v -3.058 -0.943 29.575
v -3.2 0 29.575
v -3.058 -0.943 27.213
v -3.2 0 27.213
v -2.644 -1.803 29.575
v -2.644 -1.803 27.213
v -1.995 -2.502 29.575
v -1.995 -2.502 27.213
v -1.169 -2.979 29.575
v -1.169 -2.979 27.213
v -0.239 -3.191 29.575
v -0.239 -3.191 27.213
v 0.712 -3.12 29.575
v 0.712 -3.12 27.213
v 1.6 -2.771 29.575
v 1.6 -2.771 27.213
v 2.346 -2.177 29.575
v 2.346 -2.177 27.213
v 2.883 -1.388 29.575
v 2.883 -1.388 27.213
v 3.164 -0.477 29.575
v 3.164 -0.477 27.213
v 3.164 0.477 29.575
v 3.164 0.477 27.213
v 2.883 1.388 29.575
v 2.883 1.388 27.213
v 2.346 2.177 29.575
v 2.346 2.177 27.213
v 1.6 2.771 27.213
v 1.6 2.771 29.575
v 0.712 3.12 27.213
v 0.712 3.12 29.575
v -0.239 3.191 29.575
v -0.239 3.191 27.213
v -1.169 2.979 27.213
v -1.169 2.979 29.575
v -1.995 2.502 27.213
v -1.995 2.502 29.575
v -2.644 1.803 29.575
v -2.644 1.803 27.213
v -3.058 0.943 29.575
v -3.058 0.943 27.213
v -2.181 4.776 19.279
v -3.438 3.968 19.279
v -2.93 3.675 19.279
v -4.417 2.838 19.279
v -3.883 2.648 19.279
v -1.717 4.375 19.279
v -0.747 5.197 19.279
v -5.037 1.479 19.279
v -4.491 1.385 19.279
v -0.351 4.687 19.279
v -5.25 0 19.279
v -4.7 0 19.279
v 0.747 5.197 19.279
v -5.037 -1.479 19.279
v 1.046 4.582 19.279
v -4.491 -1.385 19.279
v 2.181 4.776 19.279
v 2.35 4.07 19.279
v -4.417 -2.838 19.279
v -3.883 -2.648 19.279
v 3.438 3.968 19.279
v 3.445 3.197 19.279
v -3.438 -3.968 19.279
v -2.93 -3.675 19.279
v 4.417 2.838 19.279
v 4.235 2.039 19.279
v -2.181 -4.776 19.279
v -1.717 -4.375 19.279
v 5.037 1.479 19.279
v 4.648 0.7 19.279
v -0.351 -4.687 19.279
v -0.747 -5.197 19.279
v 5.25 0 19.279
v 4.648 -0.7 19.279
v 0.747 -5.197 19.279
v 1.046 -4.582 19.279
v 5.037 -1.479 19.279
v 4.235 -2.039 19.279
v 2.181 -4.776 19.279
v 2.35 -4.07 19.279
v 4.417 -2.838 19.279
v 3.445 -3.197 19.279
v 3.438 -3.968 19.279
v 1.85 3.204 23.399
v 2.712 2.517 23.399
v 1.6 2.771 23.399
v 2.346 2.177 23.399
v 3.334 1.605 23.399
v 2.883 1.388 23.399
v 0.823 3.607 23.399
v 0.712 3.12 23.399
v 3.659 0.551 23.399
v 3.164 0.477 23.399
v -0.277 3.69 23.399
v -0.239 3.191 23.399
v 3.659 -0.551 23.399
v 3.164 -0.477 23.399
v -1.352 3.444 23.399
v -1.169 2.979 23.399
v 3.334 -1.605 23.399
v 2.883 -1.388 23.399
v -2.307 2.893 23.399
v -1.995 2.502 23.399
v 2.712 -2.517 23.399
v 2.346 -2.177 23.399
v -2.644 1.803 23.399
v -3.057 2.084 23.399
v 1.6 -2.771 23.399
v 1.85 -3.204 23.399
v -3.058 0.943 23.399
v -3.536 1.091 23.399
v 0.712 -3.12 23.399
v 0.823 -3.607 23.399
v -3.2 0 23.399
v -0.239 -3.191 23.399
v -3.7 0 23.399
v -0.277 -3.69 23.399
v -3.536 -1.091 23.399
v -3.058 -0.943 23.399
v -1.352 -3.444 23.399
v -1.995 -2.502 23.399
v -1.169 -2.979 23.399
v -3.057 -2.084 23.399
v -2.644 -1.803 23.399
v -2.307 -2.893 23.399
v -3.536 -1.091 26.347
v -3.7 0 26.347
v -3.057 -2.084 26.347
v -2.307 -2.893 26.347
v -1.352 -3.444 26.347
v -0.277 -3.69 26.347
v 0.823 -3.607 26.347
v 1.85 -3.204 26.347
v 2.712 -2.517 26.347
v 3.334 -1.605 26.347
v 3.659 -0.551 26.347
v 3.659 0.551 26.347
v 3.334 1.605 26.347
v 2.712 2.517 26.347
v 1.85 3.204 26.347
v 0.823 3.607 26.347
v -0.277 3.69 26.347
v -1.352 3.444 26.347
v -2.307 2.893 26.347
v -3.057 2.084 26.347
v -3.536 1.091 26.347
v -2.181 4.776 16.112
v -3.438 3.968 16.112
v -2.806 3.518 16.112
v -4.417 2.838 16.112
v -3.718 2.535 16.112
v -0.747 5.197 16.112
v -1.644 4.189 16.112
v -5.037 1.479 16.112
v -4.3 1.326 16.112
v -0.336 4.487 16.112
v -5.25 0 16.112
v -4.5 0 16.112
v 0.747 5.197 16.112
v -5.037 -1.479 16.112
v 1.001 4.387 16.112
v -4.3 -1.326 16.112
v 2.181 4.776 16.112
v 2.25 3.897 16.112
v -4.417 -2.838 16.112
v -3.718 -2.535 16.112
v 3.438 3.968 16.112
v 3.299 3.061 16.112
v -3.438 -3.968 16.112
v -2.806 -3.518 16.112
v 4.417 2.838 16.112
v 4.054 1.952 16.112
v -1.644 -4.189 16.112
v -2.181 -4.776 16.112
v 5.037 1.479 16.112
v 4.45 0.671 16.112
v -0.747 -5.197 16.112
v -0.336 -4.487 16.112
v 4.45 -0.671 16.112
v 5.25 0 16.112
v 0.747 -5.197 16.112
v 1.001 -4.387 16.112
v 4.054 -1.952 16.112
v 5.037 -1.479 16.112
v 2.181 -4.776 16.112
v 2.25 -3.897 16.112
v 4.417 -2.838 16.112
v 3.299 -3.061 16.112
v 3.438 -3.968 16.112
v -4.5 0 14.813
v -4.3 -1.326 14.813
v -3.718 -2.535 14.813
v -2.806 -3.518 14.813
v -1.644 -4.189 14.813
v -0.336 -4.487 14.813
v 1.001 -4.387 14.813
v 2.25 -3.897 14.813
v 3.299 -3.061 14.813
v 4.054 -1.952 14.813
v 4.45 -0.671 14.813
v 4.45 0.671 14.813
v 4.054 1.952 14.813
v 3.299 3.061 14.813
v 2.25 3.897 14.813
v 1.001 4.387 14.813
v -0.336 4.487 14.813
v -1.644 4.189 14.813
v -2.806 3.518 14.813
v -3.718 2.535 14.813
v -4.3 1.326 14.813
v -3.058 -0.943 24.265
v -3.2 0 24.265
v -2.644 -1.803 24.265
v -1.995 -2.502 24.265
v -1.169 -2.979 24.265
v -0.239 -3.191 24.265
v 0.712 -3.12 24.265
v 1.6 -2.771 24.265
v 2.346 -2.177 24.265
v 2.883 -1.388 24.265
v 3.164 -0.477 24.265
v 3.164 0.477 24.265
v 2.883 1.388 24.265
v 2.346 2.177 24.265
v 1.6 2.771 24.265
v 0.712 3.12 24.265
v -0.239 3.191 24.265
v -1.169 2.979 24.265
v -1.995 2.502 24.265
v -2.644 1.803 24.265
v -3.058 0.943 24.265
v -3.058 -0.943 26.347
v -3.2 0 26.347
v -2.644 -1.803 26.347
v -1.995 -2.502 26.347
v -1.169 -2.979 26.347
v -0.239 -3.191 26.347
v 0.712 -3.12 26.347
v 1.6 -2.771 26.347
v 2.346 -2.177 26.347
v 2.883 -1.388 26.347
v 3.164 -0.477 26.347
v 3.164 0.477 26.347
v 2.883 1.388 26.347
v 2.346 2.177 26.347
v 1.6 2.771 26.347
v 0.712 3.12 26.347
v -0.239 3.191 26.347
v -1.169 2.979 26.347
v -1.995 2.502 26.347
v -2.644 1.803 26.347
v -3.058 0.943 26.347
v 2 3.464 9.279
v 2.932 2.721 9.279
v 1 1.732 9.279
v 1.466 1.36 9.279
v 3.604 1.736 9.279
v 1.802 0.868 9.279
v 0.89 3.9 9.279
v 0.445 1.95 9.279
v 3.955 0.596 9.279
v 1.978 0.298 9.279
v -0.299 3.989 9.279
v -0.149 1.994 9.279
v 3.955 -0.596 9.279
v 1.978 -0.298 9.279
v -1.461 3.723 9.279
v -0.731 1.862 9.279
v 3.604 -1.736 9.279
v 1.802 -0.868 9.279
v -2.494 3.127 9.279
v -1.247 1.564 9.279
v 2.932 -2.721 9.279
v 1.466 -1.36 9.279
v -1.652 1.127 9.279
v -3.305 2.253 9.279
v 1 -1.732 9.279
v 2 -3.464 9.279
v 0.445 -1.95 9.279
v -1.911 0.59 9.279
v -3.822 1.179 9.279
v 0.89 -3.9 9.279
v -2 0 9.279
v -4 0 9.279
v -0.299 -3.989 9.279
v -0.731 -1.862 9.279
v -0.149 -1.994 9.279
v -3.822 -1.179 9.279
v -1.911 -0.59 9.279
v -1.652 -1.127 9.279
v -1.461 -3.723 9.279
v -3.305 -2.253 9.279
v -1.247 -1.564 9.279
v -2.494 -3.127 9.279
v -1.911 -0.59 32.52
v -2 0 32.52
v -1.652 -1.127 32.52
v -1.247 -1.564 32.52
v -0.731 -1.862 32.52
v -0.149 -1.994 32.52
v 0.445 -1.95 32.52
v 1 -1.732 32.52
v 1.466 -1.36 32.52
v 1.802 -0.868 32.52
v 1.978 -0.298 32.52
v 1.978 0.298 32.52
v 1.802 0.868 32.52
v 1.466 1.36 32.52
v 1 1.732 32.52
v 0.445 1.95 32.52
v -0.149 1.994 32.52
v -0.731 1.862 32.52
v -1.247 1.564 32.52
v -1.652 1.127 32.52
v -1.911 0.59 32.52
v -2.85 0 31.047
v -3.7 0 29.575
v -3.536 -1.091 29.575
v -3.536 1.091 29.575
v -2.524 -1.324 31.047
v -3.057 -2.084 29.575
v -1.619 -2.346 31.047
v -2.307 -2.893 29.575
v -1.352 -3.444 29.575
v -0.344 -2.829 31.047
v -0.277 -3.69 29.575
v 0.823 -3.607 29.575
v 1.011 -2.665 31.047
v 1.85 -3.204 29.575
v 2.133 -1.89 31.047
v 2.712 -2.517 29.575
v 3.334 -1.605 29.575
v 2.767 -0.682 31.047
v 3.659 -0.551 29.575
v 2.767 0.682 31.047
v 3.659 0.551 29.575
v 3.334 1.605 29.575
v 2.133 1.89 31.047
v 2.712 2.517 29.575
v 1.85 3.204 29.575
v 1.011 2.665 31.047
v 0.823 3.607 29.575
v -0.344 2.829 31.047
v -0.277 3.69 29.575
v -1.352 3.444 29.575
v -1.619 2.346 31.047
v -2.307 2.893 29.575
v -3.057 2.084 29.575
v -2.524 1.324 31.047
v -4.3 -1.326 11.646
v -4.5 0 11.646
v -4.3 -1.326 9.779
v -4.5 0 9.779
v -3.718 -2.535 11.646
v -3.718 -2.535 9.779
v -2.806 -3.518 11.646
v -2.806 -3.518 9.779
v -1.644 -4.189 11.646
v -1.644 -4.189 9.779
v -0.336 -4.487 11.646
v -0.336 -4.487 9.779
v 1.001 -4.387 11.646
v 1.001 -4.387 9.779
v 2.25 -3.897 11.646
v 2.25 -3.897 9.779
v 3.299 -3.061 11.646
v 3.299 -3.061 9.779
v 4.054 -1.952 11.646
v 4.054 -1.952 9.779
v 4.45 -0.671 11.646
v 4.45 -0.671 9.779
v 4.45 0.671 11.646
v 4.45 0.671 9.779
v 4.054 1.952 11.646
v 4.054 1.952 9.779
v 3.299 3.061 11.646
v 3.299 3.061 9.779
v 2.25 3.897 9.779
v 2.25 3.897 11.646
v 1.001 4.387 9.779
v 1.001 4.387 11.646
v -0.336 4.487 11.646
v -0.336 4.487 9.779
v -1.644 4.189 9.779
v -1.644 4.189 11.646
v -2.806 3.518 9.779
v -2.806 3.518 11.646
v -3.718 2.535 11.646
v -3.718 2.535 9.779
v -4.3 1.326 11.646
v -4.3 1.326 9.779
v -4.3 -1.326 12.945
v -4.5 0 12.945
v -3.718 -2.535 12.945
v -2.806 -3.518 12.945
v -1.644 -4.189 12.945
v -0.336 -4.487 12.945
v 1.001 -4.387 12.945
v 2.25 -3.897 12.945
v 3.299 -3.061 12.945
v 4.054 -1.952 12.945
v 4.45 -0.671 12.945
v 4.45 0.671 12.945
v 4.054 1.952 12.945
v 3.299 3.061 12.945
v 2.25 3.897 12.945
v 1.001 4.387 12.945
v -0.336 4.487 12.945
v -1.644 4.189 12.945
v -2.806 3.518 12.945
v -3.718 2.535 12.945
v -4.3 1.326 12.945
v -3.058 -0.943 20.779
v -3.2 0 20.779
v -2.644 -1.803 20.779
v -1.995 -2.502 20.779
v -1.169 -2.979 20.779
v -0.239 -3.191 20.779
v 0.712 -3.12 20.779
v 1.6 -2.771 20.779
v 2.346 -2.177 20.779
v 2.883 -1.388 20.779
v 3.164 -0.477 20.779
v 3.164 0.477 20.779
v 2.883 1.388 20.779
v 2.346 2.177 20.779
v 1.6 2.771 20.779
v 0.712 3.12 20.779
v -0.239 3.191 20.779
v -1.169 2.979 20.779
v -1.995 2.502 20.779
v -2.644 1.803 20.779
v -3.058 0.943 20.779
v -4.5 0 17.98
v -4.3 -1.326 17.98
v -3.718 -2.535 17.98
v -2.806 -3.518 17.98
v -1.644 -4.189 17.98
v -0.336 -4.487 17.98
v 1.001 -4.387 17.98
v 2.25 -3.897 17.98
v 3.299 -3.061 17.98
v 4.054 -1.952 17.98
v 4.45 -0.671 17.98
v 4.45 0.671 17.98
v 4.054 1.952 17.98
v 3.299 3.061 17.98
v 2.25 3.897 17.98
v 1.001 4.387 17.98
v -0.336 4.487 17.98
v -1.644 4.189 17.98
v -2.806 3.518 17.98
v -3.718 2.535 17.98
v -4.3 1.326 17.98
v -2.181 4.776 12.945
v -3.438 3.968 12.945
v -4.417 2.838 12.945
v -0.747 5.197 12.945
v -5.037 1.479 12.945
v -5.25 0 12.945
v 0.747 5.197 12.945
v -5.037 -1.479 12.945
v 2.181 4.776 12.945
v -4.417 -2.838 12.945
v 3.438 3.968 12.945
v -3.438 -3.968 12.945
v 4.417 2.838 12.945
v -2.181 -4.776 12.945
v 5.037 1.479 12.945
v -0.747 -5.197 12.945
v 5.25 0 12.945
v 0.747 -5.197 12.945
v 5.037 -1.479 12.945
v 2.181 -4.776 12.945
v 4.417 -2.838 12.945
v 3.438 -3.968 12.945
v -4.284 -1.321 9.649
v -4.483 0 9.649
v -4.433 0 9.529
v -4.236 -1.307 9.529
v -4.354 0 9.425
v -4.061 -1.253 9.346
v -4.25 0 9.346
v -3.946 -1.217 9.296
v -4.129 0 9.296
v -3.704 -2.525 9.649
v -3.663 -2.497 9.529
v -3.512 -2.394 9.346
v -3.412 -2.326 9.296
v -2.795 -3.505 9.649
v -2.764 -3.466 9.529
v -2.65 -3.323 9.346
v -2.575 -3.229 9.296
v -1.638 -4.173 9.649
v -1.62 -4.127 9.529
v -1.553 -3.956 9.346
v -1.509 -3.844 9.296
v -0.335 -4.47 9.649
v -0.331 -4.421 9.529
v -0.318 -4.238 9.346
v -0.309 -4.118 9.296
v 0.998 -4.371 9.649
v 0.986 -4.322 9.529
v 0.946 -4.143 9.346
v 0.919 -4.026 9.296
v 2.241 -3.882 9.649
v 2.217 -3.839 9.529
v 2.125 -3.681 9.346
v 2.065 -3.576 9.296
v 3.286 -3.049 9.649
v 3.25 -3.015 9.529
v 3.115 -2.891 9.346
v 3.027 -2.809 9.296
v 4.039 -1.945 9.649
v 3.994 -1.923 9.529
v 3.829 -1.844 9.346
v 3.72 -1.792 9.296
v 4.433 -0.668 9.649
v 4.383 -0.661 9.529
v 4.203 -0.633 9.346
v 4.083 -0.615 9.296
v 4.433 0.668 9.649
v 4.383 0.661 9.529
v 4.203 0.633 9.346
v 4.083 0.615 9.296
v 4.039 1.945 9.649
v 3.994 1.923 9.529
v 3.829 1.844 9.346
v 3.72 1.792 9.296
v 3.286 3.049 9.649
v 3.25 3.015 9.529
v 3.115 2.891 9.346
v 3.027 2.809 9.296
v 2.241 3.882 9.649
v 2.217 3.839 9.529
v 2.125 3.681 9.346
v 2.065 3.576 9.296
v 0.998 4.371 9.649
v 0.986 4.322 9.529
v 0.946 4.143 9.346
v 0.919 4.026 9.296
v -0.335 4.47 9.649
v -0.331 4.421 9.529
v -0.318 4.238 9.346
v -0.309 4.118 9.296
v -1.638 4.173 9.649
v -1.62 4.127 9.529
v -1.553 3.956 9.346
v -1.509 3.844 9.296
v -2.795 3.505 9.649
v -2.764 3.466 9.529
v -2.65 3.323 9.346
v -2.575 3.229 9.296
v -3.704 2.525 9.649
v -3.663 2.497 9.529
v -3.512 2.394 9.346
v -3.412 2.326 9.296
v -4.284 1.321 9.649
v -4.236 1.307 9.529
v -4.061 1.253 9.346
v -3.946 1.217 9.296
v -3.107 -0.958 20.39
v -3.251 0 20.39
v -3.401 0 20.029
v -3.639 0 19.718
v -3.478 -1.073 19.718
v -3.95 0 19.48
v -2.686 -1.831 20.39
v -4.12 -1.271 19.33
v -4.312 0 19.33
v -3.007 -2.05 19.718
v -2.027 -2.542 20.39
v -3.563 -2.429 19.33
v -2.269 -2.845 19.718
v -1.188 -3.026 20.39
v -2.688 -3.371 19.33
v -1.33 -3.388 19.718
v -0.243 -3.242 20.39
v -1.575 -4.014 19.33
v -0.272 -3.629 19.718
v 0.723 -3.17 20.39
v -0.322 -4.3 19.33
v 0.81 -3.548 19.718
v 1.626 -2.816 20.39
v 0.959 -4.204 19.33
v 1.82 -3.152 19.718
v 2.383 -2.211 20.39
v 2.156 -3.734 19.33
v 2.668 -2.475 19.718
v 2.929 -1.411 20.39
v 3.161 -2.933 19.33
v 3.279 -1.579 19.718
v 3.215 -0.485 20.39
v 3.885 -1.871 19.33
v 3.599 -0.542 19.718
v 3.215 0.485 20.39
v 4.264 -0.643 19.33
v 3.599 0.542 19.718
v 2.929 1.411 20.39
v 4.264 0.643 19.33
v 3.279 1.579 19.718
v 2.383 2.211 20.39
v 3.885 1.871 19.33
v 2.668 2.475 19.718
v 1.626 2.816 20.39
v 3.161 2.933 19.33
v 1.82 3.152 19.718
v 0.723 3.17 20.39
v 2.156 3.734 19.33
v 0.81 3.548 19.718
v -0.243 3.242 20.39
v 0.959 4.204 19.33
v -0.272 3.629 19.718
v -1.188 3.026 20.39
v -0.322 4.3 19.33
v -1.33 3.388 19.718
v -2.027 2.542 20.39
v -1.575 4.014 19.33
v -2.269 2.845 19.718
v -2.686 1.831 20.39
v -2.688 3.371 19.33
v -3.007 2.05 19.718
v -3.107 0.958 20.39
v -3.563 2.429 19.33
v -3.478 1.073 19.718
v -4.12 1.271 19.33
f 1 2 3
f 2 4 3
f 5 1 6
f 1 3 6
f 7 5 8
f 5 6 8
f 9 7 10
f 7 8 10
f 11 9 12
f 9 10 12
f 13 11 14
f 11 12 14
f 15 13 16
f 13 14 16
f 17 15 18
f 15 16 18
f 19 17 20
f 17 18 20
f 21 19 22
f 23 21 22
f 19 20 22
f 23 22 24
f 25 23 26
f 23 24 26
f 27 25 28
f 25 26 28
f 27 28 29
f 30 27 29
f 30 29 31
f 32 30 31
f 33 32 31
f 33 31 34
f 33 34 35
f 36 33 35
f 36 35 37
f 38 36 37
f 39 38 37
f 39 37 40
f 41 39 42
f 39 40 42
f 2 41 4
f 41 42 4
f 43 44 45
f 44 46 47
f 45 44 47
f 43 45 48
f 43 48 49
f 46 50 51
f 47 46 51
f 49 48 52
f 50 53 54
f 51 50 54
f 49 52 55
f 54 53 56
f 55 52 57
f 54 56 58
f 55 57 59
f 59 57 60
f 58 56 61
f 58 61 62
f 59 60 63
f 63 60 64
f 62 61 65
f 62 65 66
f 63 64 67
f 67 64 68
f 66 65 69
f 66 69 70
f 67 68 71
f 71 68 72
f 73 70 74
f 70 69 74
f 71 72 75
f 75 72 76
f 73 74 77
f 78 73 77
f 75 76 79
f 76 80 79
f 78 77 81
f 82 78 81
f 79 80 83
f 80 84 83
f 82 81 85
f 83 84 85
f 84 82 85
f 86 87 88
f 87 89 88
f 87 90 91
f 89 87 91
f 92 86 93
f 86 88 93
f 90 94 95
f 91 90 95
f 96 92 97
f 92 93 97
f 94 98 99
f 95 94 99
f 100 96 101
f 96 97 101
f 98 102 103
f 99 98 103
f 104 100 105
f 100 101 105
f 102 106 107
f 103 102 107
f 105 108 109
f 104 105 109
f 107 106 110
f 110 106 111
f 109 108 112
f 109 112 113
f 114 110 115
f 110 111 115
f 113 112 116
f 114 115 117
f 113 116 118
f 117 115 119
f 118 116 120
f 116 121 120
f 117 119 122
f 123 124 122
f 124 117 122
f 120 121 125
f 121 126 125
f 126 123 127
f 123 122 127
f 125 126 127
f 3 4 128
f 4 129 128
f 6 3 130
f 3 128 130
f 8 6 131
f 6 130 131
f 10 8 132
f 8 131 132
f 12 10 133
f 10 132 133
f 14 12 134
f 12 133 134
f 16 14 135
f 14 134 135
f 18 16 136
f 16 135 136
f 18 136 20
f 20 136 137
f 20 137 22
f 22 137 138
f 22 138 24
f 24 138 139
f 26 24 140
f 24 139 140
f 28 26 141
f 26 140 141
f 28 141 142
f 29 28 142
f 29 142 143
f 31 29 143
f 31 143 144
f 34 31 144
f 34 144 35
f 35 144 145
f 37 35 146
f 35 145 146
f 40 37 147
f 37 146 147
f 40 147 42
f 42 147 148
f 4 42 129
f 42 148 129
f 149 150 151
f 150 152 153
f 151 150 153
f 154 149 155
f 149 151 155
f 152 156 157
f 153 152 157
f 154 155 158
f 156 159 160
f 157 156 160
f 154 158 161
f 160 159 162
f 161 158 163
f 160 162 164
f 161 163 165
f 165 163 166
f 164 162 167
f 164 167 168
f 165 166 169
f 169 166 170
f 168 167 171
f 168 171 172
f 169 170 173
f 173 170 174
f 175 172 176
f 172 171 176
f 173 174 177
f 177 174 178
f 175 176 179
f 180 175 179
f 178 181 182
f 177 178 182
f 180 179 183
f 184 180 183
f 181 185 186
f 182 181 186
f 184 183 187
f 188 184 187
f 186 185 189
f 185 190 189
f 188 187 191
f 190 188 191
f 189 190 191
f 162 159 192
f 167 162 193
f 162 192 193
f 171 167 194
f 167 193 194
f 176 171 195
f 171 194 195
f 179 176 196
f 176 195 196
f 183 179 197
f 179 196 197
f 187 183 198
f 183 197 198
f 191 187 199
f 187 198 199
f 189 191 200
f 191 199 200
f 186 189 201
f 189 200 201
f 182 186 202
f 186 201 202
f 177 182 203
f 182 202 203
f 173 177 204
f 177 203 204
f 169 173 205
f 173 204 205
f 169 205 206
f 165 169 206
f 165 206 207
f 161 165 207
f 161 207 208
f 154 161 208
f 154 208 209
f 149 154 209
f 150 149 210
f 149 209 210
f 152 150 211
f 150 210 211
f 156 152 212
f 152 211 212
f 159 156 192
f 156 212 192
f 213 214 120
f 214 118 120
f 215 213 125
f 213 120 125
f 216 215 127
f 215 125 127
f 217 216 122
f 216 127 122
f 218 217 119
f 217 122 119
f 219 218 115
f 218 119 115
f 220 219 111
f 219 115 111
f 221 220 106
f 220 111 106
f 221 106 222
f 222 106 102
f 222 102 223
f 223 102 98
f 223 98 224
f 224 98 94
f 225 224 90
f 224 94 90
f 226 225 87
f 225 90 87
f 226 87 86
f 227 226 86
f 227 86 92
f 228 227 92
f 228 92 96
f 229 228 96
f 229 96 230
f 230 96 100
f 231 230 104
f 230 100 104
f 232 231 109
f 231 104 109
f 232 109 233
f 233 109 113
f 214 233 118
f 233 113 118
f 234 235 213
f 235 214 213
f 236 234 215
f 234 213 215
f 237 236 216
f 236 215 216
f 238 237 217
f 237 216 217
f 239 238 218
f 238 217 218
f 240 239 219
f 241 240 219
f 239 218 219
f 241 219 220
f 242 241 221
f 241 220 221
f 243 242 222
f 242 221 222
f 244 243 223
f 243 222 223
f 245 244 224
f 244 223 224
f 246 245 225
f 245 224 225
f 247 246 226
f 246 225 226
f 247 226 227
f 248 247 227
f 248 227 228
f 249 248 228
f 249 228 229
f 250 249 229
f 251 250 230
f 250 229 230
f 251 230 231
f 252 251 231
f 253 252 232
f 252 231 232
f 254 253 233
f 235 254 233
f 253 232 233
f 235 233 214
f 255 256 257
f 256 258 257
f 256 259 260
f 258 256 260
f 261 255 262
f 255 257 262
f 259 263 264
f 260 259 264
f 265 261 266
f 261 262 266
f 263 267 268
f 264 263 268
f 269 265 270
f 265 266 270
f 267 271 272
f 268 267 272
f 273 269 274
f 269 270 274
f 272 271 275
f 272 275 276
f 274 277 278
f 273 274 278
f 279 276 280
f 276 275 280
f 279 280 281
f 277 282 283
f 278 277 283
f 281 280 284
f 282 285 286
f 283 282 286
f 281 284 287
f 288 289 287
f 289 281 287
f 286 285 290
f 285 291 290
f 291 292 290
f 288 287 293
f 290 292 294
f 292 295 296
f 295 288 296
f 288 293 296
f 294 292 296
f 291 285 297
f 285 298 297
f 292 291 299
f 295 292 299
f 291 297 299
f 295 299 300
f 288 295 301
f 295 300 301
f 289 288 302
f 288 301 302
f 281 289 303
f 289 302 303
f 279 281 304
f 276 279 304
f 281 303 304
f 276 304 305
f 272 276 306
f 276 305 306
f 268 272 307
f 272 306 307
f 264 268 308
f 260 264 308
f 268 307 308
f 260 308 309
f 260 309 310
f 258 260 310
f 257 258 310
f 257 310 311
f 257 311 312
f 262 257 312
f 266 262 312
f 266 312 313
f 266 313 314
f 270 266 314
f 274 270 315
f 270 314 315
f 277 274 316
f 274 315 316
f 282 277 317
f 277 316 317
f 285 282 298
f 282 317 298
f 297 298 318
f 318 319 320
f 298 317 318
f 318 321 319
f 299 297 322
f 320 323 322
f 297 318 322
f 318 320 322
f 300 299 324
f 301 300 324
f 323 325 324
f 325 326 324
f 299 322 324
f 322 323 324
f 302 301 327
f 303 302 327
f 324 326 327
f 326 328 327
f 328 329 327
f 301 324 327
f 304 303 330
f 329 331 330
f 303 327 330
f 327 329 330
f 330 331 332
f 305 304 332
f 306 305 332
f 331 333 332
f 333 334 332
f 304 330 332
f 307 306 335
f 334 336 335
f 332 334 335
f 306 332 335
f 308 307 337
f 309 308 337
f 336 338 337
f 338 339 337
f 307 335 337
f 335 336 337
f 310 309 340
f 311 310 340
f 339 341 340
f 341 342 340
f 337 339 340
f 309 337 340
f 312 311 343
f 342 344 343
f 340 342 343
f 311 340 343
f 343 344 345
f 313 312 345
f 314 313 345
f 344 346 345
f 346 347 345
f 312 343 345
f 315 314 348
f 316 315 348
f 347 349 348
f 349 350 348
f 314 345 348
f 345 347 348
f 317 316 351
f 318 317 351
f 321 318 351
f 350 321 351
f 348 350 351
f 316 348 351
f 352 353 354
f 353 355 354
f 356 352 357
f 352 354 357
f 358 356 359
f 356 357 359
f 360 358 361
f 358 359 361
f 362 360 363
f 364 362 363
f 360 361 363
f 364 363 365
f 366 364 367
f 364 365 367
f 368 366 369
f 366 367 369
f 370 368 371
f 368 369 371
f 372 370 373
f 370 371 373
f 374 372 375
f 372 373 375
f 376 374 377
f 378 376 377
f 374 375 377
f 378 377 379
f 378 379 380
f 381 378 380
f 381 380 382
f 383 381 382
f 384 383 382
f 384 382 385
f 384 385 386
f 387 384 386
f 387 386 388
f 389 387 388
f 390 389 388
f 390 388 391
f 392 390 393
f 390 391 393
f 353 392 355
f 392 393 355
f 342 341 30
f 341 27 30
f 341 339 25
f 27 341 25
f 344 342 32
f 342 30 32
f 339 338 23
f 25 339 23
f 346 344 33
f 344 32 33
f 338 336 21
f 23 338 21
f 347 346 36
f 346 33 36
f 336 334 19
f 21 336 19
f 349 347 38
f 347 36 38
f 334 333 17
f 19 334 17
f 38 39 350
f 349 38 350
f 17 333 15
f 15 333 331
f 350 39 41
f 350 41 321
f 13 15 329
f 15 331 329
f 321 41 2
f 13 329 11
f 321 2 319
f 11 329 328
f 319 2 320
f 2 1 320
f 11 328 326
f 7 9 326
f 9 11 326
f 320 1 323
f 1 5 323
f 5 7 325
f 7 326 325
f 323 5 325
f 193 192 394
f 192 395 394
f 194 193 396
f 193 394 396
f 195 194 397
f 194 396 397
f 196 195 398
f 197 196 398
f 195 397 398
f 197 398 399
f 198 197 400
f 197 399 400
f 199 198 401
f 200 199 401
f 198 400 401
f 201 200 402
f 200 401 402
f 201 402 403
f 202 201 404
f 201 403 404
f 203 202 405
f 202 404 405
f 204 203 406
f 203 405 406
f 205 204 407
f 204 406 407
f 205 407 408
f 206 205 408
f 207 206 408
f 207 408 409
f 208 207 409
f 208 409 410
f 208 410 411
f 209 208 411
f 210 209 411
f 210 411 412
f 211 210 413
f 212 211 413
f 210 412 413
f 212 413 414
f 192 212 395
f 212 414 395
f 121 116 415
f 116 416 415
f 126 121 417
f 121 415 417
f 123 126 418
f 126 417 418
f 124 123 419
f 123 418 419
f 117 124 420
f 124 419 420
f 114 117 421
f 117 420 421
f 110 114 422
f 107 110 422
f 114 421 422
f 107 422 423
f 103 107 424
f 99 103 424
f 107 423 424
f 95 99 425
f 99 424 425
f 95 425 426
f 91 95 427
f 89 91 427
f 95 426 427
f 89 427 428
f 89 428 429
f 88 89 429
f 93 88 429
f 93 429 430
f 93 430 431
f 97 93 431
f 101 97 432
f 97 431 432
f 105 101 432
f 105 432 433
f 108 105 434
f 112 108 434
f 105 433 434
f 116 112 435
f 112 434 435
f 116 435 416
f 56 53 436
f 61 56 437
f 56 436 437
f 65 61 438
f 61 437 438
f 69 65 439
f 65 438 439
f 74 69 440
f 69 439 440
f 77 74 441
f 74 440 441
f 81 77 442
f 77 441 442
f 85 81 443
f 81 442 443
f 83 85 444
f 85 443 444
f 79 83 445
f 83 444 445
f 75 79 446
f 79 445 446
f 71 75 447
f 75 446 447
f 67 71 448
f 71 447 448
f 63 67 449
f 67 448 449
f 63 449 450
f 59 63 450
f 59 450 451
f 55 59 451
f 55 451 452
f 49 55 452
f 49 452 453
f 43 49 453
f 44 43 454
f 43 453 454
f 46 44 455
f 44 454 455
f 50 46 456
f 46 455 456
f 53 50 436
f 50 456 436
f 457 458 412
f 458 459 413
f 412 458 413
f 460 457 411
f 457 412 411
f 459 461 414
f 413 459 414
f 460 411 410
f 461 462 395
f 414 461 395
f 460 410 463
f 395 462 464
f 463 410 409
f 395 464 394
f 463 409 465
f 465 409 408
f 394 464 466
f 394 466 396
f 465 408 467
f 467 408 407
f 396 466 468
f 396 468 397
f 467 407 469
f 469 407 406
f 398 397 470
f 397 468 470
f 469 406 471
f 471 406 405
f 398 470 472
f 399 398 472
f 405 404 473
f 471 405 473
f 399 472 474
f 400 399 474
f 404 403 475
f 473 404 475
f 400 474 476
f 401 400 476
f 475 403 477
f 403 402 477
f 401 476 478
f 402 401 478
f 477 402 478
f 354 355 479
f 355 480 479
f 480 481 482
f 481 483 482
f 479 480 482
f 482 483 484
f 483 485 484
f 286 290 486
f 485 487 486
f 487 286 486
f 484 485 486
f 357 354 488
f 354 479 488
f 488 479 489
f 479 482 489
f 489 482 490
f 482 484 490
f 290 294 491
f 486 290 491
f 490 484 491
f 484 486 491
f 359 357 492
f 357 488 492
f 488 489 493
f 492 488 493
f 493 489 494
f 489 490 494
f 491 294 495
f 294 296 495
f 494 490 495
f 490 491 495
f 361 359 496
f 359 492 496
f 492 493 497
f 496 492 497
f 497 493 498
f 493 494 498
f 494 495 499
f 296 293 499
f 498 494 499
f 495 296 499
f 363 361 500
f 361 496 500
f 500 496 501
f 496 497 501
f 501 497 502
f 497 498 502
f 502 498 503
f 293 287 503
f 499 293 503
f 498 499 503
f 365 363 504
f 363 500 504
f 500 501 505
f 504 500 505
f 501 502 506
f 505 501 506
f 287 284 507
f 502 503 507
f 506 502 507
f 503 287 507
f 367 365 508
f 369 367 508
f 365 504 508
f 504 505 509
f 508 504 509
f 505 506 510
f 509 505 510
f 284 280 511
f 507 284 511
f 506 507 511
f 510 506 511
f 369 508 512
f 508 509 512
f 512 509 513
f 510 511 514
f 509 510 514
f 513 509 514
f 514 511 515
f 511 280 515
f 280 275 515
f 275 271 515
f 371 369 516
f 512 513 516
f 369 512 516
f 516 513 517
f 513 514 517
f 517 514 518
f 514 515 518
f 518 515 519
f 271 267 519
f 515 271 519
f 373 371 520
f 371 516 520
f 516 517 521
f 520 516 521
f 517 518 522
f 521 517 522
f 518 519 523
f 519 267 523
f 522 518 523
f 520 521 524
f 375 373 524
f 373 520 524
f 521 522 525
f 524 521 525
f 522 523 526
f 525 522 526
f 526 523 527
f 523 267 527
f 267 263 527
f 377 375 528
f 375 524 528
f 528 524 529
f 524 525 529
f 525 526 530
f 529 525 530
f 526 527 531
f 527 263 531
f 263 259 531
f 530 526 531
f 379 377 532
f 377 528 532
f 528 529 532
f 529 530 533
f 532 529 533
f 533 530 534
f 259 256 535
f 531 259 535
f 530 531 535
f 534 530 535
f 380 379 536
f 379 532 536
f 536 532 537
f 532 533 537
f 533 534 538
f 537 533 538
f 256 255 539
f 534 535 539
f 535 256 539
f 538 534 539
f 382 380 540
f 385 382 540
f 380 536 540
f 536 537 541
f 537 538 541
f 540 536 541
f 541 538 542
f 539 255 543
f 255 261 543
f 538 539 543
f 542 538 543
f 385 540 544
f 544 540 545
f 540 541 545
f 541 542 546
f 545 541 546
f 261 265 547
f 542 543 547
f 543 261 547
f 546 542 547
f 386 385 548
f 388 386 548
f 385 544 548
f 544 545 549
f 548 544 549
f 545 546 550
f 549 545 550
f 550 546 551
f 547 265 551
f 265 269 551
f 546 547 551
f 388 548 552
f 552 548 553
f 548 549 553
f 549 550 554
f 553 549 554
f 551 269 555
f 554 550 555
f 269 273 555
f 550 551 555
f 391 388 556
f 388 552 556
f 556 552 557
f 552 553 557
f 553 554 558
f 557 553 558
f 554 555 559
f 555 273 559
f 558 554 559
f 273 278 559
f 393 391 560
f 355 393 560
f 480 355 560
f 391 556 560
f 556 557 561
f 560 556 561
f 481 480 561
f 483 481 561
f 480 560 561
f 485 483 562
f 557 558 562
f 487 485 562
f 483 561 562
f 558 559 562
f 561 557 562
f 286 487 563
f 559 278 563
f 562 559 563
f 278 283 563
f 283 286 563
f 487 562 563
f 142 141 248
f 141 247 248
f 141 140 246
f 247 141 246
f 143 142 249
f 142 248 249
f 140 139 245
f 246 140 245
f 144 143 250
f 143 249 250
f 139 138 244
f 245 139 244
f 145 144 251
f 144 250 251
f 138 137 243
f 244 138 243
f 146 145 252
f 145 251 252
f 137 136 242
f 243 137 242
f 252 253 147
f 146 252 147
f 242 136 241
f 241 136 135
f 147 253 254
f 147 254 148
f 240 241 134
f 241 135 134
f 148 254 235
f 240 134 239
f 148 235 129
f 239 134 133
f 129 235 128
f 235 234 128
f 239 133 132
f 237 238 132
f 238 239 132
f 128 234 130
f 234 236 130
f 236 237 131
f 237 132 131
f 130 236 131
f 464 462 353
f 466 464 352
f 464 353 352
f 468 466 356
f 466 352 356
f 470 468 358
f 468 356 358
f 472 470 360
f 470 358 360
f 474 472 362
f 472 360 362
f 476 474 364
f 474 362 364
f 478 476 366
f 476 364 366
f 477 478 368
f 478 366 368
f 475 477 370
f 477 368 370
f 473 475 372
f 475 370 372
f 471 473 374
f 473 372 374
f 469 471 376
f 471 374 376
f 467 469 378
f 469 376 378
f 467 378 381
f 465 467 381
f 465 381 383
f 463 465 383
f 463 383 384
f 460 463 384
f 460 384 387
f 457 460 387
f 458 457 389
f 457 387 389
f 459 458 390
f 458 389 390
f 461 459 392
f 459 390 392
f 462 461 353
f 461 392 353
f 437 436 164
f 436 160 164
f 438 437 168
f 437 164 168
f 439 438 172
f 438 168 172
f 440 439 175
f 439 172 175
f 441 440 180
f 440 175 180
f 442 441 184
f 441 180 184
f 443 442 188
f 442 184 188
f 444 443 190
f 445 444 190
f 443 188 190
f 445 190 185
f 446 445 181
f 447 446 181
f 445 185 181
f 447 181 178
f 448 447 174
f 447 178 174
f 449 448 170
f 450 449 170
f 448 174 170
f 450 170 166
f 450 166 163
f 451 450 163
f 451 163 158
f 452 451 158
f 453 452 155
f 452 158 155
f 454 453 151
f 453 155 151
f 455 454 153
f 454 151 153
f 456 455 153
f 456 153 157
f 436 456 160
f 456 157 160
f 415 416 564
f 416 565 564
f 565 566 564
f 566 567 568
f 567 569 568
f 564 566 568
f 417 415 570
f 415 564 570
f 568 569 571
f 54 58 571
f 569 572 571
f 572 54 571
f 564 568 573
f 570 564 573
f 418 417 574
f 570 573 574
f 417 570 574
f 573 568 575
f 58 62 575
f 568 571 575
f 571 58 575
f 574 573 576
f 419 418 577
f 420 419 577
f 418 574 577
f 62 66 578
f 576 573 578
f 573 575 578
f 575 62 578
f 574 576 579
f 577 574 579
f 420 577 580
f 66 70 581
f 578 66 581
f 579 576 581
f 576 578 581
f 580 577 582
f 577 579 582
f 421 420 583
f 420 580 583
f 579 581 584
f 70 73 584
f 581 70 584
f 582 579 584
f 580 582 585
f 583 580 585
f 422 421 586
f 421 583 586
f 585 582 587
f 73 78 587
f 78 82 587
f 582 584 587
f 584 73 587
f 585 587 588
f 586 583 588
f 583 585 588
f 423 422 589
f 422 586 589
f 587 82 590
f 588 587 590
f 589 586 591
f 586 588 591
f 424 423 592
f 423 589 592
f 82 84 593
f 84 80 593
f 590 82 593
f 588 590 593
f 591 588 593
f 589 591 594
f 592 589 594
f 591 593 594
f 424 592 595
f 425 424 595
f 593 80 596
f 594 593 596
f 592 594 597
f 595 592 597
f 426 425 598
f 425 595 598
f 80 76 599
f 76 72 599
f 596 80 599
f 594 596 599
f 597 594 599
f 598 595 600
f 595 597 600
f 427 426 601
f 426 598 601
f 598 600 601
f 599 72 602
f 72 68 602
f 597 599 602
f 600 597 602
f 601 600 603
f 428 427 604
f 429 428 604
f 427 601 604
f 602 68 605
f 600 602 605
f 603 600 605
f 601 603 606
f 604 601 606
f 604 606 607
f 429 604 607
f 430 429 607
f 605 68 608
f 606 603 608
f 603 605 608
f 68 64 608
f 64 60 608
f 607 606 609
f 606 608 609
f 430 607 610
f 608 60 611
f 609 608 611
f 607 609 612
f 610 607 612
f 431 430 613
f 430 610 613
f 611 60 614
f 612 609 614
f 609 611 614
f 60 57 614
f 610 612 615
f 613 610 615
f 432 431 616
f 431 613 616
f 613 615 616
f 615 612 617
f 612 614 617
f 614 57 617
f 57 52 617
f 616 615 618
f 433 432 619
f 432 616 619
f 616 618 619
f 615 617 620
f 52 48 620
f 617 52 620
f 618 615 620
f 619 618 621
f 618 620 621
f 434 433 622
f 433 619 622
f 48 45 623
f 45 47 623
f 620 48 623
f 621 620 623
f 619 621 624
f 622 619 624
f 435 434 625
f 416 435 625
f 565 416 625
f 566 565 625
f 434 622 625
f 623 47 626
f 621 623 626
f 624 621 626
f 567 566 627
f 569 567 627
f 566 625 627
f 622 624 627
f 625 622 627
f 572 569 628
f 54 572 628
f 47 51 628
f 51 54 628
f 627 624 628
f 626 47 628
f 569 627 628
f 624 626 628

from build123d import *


with BuildPart() as f1:
    # F0 (on Front) → F1 (revolve)
    with BuildSketch(Plane.XZ):
        with BuildLine():
            Line((-4, 9.278649), (-2, 9.278649))
            Line((-2, 9.278649), (-2, 32.519547))
            Line((-2, 32.519547), (-3.7, 29.575061))
            Line((-3.7, 29.575061), (-3.2, 29.575061))
            Line((-3.2, 29.575061), (-3.2, 27.213341))
            Line((-3.2, 27.213341), (-3.7, 26.347315))
            Line((-3.7, 26.347315), (-3.2, 26.347315))
            Line((-3.2, 26.347315), (-3.2, 24.264861))
            Line((-3.2, 24.264861), (-3.7, 23.398835))
            Line((-3.7, 23.398835), (-3.2, 23.398835))
            Line((-3.2, 23.398835), (-3.2, 20.778649))
            ThreePointArc((-3.2, 20.778649), (-3.63934, 19.717989), (-4.7, 19.278649))
            Line((-4.7, 19.278649), (-5.25, 19.278649))
            Line((-5.25, 19.278649), (-4.5, 17.979611))
            Line((-4.5, 17.979611), (-4.5, 16.111982))
            Line((-4.5, 16.111982), (-5.25, 16.111982))
            Line((-5.25, 16.111982), (-4.5, 14.812944))
            Line((-4.5, 14.812944), (-4.5, 12.945316))
            Line((-4.5, 12.945316), (-5.25, 12.945316))
            Line((-5.25, 12.945316), (-4.5, 11.646278))
            Line((-4.5, 11.646278), (-4.5, 9.778649))
            ThreePointArc((-4.5, 9.778649), (-4.353553, 9.425096), (-4, 9.278649))
        make_face()
    revolve(axis=Axis((0, 0, 13.09317), (0, 0, 1)))


solid = f1.part
